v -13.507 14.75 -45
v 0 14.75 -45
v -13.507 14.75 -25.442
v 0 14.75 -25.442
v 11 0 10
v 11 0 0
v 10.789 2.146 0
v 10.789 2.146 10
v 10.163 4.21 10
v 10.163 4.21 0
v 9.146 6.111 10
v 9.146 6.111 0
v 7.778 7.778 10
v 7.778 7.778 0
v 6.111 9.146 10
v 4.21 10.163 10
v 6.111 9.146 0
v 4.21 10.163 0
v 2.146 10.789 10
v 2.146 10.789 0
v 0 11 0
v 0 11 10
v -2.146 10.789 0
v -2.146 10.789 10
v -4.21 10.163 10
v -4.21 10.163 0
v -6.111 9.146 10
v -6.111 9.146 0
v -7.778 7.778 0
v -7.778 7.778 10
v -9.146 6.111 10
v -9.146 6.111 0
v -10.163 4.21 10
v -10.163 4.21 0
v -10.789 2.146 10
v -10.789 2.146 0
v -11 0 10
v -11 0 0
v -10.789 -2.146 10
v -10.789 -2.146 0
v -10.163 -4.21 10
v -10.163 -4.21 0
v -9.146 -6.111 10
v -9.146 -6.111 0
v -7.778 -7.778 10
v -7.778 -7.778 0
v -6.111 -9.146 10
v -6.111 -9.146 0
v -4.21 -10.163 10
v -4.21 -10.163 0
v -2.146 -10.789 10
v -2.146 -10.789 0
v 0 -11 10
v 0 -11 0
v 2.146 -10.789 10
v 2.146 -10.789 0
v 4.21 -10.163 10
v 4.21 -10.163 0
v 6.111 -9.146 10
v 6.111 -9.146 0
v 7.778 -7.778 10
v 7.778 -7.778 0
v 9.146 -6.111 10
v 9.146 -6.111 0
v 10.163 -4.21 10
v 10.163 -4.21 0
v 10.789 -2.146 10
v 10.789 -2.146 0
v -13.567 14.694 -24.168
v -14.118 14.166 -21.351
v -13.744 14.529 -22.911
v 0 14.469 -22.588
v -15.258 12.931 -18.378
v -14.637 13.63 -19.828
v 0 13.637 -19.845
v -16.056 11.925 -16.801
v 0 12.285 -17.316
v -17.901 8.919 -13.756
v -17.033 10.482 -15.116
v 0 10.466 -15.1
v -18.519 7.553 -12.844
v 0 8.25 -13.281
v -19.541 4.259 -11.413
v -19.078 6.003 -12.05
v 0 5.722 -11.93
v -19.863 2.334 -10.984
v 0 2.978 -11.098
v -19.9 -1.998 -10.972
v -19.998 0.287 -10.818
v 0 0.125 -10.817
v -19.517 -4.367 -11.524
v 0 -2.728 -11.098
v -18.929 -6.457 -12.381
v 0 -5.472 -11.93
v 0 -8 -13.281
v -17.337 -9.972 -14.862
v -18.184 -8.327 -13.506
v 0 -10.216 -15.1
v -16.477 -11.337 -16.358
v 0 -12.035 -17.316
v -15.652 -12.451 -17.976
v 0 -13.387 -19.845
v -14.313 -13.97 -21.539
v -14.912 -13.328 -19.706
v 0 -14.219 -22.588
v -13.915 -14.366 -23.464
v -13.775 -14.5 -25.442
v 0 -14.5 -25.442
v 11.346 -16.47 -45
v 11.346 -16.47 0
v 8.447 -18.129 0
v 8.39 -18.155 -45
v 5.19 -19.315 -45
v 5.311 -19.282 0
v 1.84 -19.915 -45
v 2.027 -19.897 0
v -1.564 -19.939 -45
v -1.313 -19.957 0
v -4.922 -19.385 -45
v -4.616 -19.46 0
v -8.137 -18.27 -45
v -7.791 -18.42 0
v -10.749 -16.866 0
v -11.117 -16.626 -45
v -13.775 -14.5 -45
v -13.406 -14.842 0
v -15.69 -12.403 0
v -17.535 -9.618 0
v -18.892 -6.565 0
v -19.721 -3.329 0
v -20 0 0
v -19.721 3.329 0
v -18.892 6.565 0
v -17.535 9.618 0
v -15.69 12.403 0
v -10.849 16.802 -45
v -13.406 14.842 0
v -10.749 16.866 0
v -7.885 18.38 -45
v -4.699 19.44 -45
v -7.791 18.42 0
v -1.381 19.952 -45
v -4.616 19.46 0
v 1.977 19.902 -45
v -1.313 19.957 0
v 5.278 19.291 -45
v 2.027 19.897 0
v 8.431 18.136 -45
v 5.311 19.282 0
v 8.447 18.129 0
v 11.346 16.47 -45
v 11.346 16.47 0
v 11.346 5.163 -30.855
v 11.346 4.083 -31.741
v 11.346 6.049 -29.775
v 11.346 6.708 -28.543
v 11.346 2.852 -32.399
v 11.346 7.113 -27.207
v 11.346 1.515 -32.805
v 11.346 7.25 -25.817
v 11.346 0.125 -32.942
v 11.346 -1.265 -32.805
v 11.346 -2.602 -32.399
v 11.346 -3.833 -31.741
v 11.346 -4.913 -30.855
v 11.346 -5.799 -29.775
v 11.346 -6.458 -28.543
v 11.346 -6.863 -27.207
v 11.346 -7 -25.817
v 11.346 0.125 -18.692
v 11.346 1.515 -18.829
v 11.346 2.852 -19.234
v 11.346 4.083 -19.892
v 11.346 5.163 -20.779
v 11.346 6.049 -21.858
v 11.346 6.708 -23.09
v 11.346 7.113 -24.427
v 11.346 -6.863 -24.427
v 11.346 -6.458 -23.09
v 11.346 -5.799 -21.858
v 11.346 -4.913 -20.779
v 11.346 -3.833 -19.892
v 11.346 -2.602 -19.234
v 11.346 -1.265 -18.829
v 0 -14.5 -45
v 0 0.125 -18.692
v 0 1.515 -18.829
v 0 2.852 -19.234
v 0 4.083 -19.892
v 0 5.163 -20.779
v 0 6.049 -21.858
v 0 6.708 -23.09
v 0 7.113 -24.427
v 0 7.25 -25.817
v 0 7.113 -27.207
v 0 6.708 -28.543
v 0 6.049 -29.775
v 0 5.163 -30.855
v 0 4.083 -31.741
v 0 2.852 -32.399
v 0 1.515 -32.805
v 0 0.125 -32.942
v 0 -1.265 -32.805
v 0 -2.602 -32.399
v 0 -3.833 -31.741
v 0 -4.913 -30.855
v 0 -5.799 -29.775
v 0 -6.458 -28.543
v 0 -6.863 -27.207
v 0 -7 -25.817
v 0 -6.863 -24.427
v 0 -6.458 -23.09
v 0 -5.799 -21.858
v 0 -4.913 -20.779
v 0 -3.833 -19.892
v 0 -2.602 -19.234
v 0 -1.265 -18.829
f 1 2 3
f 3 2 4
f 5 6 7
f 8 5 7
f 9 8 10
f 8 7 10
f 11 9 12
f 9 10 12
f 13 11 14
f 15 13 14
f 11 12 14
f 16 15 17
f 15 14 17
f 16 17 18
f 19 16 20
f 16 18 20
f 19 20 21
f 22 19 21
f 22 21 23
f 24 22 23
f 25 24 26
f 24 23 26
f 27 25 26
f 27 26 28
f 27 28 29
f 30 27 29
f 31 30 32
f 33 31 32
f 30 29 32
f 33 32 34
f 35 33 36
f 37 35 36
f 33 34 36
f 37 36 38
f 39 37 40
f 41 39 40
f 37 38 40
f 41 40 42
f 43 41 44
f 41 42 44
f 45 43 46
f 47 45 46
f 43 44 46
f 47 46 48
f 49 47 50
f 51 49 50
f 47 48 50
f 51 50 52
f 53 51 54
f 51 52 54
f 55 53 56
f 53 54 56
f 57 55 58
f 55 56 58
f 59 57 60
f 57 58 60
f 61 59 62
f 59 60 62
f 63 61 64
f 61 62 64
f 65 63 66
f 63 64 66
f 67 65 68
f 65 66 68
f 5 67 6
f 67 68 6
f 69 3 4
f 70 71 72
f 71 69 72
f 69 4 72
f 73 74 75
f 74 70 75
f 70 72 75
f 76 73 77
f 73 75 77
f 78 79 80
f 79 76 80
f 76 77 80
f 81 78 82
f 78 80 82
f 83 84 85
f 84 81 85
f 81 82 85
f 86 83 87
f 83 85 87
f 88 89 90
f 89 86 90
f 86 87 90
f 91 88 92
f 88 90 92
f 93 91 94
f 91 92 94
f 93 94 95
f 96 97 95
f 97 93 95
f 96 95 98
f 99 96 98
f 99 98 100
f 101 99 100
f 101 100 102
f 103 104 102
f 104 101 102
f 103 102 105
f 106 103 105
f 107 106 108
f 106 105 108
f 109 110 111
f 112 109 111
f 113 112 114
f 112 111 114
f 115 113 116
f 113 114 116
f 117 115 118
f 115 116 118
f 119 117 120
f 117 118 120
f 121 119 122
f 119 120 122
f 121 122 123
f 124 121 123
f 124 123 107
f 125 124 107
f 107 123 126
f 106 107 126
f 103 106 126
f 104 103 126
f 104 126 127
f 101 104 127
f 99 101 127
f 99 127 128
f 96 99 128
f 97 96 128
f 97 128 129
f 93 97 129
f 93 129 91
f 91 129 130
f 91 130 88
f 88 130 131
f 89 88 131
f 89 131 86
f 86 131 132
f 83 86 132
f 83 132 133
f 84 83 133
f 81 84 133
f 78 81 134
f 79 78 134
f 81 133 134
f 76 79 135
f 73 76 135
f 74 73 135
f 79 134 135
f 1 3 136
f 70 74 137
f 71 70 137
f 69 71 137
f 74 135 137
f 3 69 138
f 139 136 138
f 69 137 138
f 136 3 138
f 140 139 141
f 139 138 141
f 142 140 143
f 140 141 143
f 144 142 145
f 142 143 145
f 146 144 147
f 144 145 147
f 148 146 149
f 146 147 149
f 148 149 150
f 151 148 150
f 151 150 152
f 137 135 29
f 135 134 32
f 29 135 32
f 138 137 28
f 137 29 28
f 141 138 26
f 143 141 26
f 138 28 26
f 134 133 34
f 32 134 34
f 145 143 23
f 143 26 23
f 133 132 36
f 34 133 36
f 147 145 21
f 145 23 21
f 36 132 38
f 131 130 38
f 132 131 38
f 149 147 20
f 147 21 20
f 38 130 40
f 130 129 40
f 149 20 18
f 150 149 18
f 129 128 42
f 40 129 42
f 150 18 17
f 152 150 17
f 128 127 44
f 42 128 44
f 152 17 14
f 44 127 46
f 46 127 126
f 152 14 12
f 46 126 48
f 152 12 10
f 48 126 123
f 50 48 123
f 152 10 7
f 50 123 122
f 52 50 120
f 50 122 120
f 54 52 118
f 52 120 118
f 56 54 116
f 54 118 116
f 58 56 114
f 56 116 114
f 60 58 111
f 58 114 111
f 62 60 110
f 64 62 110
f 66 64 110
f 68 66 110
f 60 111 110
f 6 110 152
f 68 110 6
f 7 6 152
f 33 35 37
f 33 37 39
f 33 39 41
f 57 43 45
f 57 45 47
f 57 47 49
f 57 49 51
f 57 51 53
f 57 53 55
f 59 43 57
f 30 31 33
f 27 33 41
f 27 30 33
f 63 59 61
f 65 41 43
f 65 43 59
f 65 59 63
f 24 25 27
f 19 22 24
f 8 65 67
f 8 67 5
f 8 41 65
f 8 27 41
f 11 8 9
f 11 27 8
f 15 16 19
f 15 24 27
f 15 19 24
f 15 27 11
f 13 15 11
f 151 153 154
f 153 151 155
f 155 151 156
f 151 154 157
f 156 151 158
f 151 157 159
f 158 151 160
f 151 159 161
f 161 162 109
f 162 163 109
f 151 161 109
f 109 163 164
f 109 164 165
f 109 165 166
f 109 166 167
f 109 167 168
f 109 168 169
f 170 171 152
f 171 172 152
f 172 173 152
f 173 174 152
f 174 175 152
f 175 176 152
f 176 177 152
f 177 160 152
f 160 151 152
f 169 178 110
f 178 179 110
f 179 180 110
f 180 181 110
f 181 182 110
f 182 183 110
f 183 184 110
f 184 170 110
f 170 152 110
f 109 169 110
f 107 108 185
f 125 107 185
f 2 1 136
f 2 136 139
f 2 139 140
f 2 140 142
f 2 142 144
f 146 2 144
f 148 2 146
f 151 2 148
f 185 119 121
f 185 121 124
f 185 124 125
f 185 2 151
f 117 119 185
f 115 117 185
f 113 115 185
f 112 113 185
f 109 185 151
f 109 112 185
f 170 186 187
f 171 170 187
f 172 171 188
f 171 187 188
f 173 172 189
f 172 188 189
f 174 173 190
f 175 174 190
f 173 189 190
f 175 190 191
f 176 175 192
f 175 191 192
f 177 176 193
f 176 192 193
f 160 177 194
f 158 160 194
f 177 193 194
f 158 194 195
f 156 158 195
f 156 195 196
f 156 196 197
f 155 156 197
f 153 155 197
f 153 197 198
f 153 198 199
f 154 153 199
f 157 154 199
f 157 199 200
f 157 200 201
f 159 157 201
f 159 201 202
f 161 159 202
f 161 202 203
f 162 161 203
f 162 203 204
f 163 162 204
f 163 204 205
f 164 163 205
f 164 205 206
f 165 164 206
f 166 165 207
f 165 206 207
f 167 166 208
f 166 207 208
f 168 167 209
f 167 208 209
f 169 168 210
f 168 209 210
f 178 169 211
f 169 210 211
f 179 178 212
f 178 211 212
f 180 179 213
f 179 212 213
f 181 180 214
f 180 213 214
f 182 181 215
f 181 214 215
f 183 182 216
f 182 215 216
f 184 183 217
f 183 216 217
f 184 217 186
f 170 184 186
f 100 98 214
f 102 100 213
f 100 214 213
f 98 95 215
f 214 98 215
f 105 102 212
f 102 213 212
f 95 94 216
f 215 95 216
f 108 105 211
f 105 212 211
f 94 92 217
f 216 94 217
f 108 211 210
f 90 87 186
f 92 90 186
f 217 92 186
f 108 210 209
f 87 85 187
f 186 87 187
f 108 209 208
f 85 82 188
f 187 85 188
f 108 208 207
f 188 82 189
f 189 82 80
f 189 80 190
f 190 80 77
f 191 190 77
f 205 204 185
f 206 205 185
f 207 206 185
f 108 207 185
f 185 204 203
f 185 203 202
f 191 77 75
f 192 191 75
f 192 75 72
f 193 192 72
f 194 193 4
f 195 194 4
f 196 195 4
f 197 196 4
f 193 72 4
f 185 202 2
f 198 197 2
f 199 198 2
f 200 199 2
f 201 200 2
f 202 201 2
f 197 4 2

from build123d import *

# Parameters (mm, degrees)
SKETCH1_R           = 11
BOSS_EXTRUDE1_DEPTH = 10
SKETCH2_R           = 20
BOSS_EXTRUDE2_DEPTH = 45
CUT_EXTRUDE1_DEPTH  = 54.150729064
SKETCH5_R           = 7.125
CUT_EXTRUDE2_DEPTH  = 54.150729224
CUT_EXTRUDE3_START  = -45
CUT_EXTRUDE3_DEPTH  = 45


with BuildPart() as part:
    # Sketch1 → Boss-Extrude1 (new body)
    with BuildSketch(Plane.XY):
        Circle(SKETCH1_R)
    extrude(amount=BOSS_EXTRUDE1_DEPTH)

    # Sketch2 → Boss-Extrude2 (add)
    with BuildSketch(Plane(origin=(0, 0, 0), x_dir=(-1, 0, 0), z_dir=(0, 0, -1))):
        with Locations(Location((0, 0, 0), (0, 0, 180))):
            Circle(SKETCH2_R)
    extrude(amount=BOSS_EXTRUDE2_DEPTH)

    # Sketch3 → Cut-Extrude1 (cut, through all)
    with BuildSketch(Plane(origin=(0, 0, 0), x_dir=(0, 0, -1), z_dir=(1, 0, 0))):
        with BuildLine():
            Line((75.441676997, 14.75), (25.441676997, 14.75))
            ThreePointArc((25.441676997, 14.75), (10.816676997, 0.125), (25.441676997, -14.5))
            Line((25.441676997, -14.5), (75.441676997, -14.5))
            Line((75.441676997, -14.5), (75.441676997, 14.75))
        make_face()
    extrude(amount=-CUT_EXTRUDE1_DEPTH, mode=Mode.SUBTRACT)

    # Sketch5 → Cut-Extrude2 (cut, through all)
    with BuildSketch(Plane.ZY):
        with Locations((-25.816676997, 0.125)):
            Circle(SKETCH5_R)
    extrude(amount=-CUT_EXTRUDE2_DEPTH, mode=Mode.SUBTRACT)

    # Sketch6 → Cut-Extrude3 (cut)
    with BuildSketch(Plane(origin=(0, 0, -45), x_dir=(-1, 0, 0), z_dir=(0, 0, -1)).offset(CUT_EXTRUDE3_START)):
        with BuildLine():
            Line((-11.346386998, 16.469957562), (-11.346386998, -16.469957562))
            ThreePointArc((-11.346386998, -16.469957562), (-20, 0), (-11.346386998, 16.469957562))
        make_face()
    extrude(amount=CUT_EXTRUDE3_DEPTH, mode=Mode.SUBTRACT)


solid = part.part
